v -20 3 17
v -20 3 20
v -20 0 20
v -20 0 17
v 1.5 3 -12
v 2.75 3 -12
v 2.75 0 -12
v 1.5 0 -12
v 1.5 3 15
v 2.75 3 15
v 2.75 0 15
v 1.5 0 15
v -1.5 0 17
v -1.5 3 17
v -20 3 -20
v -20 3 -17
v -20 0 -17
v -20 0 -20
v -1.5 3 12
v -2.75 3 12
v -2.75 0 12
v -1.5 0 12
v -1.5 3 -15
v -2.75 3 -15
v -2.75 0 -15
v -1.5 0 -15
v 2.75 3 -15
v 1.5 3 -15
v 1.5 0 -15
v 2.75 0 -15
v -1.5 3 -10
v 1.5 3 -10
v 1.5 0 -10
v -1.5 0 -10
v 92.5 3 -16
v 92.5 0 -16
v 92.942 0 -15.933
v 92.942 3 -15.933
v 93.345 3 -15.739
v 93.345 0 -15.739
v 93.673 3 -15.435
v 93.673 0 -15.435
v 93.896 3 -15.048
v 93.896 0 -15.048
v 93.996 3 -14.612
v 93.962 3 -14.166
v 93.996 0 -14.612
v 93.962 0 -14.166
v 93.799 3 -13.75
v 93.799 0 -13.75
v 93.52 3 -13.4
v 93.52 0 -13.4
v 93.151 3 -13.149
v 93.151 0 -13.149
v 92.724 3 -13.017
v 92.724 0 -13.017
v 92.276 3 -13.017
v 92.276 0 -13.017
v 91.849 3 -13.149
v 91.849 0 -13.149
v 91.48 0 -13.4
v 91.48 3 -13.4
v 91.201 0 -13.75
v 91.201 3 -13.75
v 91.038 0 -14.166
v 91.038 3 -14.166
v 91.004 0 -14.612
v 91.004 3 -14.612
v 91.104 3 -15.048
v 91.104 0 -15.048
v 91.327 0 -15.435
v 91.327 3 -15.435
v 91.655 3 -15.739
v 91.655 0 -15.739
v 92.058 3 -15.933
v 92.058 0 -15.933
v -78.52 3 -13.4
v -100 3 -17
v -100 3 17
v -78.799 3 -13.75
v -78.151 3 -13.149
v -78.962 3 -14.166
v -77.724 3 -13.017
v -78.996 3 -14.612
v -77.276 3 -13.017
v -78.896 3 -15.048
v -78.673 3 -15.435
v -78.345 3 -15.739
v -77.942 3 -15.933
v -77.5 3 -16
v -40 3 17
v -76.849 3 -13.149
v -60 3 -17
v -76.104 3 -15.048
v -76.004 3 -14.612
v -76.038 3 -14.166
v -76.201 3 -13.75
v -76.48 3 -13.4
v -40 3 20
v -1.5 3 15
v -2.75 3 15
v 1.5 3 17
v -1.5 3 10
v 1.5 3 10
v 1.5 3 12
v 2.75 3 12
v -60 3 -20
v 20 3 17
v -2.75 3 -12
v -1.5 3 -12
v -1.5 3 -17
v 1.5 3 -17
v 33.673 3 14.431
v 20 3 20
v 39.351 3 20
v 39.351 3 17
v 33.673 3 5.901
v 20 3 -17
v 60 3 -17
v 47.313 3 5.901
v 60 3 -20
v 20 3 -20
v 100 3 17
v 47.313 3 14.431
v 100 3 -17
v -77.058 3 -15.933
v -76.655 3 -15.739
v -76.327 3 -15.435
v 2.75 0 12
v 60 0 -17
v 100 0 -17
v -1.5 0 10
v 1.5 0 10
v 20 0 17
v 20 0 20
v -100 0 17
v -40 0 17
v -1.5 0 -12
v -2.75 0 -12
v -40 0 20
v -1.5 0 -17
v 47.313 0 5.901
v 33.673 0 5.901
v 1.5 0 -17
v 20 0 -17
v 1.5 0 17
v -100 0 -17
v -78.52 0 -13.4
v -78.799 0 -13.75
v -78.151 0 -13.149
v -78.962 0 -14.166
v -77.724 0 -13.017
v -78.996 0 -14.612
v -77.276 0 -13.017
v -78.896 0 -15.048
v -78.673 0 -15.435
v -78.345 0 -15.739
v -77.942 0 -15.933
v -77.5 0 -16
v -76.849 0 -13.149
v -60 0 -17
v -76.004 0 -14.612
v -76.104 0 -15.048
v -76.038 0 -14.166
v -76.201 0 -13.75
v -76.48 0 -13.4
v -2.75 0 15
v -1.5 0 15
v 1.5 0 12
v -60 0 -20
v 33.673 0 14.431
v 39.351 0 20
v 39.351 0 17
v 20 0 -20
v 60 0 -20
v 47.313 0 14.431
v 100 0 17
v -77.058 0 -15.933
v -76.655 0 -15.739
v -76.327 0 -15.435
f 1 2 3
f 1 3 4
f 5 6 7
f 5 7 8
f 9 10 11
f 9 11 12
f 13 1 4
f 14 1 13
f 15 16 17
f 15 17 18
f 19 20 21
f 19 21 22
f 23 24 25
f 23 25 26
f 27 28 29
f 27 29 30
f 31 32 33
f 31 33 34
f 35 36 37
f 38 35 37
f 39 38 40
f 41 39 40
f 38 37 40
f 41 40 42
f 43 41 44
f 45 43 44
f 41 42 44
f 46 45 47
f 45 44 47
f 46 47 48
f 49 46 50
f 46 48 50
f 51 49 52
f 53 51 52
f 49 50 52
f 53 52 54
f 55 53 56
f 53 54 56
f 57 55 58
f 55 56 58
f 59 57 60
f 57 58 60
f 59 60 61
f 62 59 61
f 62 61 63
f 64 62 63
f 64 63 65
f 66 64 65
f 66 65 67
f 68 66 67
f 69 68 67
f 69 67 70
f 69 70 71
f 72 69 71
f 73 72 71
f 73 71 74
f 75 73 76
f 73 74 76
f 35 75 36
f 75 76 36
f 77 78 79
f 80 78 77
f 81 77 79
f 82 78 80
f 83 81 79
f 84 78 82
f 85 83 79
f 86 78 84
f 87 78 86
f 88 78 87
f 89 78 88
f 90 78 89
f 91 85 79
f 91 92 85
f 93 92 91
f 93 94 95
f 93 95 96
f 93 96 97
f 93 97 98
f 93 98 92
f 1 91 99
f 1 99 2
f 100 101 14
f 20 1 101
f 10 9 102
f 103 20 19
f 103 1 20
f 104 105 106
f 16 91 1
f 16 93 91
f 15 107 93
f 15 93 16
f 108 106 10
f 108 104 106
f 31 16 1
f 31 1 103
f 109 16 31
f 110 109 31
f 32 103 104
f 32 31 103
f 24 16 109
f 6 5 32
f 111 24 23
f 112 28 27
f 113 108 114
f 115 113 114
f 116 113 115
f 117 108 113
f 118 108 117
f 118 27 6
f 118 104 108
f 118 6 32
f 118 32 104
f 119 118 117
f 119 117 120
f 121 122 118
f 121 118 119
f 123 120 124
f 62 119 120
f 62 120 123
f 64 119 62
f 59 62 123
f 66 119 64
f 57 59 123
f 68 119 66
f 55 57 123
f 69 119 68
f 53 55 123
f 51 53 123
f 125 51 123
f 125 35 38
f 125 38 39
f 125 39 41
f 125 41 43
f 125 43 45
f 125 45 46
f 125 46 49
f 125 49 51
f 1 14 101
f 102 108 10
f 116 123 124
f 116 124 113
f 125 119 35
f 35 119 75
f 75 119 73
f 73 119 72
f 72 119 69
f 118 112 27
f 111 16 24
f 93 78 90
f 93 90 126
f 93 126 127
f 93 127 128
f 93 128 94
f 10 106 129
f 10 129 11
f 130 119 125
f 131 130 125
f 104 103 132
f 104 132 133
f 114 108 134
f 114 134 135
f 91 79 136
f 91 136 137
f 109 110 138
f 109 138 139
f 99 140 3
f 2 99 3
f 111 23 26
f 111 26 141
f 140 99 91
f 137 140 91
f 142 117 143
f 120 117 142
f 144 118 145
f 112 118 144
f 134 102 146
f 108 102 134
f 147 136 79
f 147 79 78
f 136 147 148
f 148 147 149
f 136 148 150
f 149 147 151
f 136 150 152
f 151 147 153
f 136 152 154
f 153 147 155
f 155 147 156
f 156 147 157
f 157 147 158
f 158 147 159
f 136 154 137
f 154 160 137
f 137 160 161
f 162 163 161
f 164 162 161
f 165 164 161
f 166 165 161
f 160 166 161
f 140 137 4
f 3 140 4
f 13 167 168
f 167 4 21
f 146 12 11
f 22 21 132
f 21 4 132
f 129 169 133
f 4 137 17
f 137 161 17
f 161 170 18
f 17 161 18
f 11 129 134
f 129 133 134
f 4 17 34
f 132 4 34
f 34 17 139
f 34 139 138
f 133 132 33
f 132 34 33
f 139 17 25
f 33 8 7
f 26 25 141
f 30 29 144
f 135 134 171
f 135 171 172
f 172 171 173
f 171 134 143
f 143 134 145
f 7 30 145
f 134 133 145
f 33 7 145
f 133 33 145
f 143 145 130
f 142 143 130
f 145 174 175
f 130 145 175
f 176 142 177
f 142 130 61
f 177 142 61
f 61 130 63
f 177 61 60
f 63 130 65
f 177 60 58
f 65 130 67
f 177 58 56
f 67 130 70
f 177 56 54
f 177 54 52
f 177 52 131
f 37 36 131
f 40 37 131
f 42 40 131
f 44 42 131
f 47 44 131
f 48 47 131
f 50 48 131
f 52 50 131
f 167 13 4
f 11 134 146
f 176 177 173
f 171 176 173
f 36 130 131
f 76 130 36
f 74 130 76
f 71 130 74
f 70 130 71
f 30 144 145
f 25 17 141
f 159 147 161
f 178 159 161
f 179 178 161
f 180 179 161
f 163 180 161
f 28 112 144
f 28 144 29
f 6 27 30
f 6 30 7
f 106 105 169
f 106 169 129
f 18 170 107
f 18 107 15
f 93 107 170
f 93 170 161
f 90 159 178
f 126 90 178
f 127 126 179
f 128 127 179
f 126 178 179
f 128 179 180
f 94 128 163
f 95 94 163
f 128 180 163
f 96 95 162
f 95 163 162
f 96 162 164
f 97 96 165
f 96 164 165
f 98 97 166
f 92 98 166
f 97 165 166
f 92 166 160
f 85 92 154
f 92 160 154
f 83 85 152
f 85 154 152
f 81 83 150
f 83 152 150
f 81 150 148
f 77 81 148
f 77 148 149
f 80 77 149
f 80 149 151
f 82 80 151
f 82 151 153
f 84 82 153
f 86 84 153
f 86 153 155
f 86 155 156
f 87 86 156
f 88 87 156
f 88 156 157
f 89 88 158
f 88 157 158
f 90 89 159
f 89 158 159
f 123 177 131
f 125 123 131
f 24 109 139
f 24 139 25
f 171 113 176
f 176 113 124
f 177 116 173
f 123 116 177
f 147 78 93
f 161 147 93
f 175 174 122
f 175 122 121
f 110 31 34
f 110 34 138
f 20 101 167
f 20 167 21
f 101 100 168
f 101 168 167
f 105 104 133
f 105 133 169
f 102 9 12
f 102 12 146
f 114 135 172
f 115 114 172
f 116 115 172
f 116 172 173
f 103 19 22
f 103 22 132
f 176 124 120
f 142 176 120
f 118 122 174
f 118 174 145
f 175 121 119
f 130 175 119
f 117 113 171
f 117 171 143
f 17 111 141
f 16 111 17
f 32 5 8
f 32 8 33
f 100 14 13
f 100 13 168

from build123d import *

# Parameters (mm, degrees)
SKETCH1_W           = 200
SKETCH1_H           = 40
BOSS_EXTRUDE1_DEPTH = 3
SKETCH3_W           = 60
SKETCH3_H           = 3
SKETCH3_W_2         = 60.649381746
CUT_EXTRUDE1_DEPTH  = 3
SKETCH4_W           = 13.64
SKETCH4_H           = 8.53
CUT_EXTRUDE2_DEPTH  = 3
SKETCH6_R           = 1.5
CUT_EXTRUDE3_DEPTH  = 3


with BuildPart() as part:
    # Sketch1 → Boss-Extrude1 (new body)
    with BuildSketch(Plane(origin=(0, 0, 0), x_dir=(1, 0, 0), z_dir=(0, 1, 0))):
        Rectangle(SKETCH1_W, SKETCH1_H)
    extrude(amount=BOSS_EXTRUDE1_DEPTH)

    # Sketch3 → Cut-Extrude1 (cut)
    with BuildSketch(Plane(origin=(0, 3, 0), x_dir=(1, 0, 0), z_dir=(0, 1, 0))):
        Polygon((-20, -20), (-20, -17), (-1.5, -17), (-1.5, -15), (-2.75, -15), (-2.75, -12), (-1.5, -12), (-1.5, -10), (1.5, -10), (1.5, -12), (2.75, -12), (2.75, -15), (1.5, -15), (1.5, -17), (20, -17), (20, -20), align=None)
        with Locations((-70, -18.5)):
            Rectangle(SKETCH3_W, SKETCH3_H)
        with Locations((69.675309127, -18.5)):
            Rectangle(SKETCH3_W_2, SKETCH3_H)
        Polygon((85, 17), (100, 17), (100, 20), (60, 20), (60, 17), (82, 17), align=None)
        Polygon((20, 20), (20, 17), (1.5, 17), (1.5, 15), (2.75, 15), (2.75, 12), (1.5, 12), (1.5, 10), (-1.5, 10), (-1.5, 12), (-2.75, 12), (-2.75, 15), (-1.5, 15), (-1.5, 17), (-20, 17), (-20, 20), align=None)
        Polygon((-60, 20), (-60, 17), (-82, 17), (-85, 17), (-100, 17), (-100, 20), align=None)
    extrude(amount=-CUT_EXTRUDE1_DEPTH, mode=Mode.SUBTRACT)

    # Sketch4 → Cut-Extrude2 (cut)
    with BuildSketch(Plane(origin=(0, 3, 0), x_dir=(1, 0, 0), z_dir=(0, 1, 0))):
        with Locations((40.492611387, -10.166269366)):
            Rectangle(SKETCH4_W, SKETCH4_H)
    extrude(amount=-CUT_EXTRUDE2_DEPTH, mode=Mode.SUBTRACT)

    # Sketch6 → Cut-Extrude3 (cut)
    with BuildSketch(Plane.XZ):
        with Locations(Location((92.5, -14.5, 0), (0, 0, 270))):
            Circle(SKETCH6_R)
        with Locations(Location((-77.5, -14.5, 0), (0, 0, 270))):
            Circle(SKETCH6_R)
    extrude(amount=-CUT_EXTRUDE3_DEPTH, mode=Mode.SUBTRACT)


solid = part.part
